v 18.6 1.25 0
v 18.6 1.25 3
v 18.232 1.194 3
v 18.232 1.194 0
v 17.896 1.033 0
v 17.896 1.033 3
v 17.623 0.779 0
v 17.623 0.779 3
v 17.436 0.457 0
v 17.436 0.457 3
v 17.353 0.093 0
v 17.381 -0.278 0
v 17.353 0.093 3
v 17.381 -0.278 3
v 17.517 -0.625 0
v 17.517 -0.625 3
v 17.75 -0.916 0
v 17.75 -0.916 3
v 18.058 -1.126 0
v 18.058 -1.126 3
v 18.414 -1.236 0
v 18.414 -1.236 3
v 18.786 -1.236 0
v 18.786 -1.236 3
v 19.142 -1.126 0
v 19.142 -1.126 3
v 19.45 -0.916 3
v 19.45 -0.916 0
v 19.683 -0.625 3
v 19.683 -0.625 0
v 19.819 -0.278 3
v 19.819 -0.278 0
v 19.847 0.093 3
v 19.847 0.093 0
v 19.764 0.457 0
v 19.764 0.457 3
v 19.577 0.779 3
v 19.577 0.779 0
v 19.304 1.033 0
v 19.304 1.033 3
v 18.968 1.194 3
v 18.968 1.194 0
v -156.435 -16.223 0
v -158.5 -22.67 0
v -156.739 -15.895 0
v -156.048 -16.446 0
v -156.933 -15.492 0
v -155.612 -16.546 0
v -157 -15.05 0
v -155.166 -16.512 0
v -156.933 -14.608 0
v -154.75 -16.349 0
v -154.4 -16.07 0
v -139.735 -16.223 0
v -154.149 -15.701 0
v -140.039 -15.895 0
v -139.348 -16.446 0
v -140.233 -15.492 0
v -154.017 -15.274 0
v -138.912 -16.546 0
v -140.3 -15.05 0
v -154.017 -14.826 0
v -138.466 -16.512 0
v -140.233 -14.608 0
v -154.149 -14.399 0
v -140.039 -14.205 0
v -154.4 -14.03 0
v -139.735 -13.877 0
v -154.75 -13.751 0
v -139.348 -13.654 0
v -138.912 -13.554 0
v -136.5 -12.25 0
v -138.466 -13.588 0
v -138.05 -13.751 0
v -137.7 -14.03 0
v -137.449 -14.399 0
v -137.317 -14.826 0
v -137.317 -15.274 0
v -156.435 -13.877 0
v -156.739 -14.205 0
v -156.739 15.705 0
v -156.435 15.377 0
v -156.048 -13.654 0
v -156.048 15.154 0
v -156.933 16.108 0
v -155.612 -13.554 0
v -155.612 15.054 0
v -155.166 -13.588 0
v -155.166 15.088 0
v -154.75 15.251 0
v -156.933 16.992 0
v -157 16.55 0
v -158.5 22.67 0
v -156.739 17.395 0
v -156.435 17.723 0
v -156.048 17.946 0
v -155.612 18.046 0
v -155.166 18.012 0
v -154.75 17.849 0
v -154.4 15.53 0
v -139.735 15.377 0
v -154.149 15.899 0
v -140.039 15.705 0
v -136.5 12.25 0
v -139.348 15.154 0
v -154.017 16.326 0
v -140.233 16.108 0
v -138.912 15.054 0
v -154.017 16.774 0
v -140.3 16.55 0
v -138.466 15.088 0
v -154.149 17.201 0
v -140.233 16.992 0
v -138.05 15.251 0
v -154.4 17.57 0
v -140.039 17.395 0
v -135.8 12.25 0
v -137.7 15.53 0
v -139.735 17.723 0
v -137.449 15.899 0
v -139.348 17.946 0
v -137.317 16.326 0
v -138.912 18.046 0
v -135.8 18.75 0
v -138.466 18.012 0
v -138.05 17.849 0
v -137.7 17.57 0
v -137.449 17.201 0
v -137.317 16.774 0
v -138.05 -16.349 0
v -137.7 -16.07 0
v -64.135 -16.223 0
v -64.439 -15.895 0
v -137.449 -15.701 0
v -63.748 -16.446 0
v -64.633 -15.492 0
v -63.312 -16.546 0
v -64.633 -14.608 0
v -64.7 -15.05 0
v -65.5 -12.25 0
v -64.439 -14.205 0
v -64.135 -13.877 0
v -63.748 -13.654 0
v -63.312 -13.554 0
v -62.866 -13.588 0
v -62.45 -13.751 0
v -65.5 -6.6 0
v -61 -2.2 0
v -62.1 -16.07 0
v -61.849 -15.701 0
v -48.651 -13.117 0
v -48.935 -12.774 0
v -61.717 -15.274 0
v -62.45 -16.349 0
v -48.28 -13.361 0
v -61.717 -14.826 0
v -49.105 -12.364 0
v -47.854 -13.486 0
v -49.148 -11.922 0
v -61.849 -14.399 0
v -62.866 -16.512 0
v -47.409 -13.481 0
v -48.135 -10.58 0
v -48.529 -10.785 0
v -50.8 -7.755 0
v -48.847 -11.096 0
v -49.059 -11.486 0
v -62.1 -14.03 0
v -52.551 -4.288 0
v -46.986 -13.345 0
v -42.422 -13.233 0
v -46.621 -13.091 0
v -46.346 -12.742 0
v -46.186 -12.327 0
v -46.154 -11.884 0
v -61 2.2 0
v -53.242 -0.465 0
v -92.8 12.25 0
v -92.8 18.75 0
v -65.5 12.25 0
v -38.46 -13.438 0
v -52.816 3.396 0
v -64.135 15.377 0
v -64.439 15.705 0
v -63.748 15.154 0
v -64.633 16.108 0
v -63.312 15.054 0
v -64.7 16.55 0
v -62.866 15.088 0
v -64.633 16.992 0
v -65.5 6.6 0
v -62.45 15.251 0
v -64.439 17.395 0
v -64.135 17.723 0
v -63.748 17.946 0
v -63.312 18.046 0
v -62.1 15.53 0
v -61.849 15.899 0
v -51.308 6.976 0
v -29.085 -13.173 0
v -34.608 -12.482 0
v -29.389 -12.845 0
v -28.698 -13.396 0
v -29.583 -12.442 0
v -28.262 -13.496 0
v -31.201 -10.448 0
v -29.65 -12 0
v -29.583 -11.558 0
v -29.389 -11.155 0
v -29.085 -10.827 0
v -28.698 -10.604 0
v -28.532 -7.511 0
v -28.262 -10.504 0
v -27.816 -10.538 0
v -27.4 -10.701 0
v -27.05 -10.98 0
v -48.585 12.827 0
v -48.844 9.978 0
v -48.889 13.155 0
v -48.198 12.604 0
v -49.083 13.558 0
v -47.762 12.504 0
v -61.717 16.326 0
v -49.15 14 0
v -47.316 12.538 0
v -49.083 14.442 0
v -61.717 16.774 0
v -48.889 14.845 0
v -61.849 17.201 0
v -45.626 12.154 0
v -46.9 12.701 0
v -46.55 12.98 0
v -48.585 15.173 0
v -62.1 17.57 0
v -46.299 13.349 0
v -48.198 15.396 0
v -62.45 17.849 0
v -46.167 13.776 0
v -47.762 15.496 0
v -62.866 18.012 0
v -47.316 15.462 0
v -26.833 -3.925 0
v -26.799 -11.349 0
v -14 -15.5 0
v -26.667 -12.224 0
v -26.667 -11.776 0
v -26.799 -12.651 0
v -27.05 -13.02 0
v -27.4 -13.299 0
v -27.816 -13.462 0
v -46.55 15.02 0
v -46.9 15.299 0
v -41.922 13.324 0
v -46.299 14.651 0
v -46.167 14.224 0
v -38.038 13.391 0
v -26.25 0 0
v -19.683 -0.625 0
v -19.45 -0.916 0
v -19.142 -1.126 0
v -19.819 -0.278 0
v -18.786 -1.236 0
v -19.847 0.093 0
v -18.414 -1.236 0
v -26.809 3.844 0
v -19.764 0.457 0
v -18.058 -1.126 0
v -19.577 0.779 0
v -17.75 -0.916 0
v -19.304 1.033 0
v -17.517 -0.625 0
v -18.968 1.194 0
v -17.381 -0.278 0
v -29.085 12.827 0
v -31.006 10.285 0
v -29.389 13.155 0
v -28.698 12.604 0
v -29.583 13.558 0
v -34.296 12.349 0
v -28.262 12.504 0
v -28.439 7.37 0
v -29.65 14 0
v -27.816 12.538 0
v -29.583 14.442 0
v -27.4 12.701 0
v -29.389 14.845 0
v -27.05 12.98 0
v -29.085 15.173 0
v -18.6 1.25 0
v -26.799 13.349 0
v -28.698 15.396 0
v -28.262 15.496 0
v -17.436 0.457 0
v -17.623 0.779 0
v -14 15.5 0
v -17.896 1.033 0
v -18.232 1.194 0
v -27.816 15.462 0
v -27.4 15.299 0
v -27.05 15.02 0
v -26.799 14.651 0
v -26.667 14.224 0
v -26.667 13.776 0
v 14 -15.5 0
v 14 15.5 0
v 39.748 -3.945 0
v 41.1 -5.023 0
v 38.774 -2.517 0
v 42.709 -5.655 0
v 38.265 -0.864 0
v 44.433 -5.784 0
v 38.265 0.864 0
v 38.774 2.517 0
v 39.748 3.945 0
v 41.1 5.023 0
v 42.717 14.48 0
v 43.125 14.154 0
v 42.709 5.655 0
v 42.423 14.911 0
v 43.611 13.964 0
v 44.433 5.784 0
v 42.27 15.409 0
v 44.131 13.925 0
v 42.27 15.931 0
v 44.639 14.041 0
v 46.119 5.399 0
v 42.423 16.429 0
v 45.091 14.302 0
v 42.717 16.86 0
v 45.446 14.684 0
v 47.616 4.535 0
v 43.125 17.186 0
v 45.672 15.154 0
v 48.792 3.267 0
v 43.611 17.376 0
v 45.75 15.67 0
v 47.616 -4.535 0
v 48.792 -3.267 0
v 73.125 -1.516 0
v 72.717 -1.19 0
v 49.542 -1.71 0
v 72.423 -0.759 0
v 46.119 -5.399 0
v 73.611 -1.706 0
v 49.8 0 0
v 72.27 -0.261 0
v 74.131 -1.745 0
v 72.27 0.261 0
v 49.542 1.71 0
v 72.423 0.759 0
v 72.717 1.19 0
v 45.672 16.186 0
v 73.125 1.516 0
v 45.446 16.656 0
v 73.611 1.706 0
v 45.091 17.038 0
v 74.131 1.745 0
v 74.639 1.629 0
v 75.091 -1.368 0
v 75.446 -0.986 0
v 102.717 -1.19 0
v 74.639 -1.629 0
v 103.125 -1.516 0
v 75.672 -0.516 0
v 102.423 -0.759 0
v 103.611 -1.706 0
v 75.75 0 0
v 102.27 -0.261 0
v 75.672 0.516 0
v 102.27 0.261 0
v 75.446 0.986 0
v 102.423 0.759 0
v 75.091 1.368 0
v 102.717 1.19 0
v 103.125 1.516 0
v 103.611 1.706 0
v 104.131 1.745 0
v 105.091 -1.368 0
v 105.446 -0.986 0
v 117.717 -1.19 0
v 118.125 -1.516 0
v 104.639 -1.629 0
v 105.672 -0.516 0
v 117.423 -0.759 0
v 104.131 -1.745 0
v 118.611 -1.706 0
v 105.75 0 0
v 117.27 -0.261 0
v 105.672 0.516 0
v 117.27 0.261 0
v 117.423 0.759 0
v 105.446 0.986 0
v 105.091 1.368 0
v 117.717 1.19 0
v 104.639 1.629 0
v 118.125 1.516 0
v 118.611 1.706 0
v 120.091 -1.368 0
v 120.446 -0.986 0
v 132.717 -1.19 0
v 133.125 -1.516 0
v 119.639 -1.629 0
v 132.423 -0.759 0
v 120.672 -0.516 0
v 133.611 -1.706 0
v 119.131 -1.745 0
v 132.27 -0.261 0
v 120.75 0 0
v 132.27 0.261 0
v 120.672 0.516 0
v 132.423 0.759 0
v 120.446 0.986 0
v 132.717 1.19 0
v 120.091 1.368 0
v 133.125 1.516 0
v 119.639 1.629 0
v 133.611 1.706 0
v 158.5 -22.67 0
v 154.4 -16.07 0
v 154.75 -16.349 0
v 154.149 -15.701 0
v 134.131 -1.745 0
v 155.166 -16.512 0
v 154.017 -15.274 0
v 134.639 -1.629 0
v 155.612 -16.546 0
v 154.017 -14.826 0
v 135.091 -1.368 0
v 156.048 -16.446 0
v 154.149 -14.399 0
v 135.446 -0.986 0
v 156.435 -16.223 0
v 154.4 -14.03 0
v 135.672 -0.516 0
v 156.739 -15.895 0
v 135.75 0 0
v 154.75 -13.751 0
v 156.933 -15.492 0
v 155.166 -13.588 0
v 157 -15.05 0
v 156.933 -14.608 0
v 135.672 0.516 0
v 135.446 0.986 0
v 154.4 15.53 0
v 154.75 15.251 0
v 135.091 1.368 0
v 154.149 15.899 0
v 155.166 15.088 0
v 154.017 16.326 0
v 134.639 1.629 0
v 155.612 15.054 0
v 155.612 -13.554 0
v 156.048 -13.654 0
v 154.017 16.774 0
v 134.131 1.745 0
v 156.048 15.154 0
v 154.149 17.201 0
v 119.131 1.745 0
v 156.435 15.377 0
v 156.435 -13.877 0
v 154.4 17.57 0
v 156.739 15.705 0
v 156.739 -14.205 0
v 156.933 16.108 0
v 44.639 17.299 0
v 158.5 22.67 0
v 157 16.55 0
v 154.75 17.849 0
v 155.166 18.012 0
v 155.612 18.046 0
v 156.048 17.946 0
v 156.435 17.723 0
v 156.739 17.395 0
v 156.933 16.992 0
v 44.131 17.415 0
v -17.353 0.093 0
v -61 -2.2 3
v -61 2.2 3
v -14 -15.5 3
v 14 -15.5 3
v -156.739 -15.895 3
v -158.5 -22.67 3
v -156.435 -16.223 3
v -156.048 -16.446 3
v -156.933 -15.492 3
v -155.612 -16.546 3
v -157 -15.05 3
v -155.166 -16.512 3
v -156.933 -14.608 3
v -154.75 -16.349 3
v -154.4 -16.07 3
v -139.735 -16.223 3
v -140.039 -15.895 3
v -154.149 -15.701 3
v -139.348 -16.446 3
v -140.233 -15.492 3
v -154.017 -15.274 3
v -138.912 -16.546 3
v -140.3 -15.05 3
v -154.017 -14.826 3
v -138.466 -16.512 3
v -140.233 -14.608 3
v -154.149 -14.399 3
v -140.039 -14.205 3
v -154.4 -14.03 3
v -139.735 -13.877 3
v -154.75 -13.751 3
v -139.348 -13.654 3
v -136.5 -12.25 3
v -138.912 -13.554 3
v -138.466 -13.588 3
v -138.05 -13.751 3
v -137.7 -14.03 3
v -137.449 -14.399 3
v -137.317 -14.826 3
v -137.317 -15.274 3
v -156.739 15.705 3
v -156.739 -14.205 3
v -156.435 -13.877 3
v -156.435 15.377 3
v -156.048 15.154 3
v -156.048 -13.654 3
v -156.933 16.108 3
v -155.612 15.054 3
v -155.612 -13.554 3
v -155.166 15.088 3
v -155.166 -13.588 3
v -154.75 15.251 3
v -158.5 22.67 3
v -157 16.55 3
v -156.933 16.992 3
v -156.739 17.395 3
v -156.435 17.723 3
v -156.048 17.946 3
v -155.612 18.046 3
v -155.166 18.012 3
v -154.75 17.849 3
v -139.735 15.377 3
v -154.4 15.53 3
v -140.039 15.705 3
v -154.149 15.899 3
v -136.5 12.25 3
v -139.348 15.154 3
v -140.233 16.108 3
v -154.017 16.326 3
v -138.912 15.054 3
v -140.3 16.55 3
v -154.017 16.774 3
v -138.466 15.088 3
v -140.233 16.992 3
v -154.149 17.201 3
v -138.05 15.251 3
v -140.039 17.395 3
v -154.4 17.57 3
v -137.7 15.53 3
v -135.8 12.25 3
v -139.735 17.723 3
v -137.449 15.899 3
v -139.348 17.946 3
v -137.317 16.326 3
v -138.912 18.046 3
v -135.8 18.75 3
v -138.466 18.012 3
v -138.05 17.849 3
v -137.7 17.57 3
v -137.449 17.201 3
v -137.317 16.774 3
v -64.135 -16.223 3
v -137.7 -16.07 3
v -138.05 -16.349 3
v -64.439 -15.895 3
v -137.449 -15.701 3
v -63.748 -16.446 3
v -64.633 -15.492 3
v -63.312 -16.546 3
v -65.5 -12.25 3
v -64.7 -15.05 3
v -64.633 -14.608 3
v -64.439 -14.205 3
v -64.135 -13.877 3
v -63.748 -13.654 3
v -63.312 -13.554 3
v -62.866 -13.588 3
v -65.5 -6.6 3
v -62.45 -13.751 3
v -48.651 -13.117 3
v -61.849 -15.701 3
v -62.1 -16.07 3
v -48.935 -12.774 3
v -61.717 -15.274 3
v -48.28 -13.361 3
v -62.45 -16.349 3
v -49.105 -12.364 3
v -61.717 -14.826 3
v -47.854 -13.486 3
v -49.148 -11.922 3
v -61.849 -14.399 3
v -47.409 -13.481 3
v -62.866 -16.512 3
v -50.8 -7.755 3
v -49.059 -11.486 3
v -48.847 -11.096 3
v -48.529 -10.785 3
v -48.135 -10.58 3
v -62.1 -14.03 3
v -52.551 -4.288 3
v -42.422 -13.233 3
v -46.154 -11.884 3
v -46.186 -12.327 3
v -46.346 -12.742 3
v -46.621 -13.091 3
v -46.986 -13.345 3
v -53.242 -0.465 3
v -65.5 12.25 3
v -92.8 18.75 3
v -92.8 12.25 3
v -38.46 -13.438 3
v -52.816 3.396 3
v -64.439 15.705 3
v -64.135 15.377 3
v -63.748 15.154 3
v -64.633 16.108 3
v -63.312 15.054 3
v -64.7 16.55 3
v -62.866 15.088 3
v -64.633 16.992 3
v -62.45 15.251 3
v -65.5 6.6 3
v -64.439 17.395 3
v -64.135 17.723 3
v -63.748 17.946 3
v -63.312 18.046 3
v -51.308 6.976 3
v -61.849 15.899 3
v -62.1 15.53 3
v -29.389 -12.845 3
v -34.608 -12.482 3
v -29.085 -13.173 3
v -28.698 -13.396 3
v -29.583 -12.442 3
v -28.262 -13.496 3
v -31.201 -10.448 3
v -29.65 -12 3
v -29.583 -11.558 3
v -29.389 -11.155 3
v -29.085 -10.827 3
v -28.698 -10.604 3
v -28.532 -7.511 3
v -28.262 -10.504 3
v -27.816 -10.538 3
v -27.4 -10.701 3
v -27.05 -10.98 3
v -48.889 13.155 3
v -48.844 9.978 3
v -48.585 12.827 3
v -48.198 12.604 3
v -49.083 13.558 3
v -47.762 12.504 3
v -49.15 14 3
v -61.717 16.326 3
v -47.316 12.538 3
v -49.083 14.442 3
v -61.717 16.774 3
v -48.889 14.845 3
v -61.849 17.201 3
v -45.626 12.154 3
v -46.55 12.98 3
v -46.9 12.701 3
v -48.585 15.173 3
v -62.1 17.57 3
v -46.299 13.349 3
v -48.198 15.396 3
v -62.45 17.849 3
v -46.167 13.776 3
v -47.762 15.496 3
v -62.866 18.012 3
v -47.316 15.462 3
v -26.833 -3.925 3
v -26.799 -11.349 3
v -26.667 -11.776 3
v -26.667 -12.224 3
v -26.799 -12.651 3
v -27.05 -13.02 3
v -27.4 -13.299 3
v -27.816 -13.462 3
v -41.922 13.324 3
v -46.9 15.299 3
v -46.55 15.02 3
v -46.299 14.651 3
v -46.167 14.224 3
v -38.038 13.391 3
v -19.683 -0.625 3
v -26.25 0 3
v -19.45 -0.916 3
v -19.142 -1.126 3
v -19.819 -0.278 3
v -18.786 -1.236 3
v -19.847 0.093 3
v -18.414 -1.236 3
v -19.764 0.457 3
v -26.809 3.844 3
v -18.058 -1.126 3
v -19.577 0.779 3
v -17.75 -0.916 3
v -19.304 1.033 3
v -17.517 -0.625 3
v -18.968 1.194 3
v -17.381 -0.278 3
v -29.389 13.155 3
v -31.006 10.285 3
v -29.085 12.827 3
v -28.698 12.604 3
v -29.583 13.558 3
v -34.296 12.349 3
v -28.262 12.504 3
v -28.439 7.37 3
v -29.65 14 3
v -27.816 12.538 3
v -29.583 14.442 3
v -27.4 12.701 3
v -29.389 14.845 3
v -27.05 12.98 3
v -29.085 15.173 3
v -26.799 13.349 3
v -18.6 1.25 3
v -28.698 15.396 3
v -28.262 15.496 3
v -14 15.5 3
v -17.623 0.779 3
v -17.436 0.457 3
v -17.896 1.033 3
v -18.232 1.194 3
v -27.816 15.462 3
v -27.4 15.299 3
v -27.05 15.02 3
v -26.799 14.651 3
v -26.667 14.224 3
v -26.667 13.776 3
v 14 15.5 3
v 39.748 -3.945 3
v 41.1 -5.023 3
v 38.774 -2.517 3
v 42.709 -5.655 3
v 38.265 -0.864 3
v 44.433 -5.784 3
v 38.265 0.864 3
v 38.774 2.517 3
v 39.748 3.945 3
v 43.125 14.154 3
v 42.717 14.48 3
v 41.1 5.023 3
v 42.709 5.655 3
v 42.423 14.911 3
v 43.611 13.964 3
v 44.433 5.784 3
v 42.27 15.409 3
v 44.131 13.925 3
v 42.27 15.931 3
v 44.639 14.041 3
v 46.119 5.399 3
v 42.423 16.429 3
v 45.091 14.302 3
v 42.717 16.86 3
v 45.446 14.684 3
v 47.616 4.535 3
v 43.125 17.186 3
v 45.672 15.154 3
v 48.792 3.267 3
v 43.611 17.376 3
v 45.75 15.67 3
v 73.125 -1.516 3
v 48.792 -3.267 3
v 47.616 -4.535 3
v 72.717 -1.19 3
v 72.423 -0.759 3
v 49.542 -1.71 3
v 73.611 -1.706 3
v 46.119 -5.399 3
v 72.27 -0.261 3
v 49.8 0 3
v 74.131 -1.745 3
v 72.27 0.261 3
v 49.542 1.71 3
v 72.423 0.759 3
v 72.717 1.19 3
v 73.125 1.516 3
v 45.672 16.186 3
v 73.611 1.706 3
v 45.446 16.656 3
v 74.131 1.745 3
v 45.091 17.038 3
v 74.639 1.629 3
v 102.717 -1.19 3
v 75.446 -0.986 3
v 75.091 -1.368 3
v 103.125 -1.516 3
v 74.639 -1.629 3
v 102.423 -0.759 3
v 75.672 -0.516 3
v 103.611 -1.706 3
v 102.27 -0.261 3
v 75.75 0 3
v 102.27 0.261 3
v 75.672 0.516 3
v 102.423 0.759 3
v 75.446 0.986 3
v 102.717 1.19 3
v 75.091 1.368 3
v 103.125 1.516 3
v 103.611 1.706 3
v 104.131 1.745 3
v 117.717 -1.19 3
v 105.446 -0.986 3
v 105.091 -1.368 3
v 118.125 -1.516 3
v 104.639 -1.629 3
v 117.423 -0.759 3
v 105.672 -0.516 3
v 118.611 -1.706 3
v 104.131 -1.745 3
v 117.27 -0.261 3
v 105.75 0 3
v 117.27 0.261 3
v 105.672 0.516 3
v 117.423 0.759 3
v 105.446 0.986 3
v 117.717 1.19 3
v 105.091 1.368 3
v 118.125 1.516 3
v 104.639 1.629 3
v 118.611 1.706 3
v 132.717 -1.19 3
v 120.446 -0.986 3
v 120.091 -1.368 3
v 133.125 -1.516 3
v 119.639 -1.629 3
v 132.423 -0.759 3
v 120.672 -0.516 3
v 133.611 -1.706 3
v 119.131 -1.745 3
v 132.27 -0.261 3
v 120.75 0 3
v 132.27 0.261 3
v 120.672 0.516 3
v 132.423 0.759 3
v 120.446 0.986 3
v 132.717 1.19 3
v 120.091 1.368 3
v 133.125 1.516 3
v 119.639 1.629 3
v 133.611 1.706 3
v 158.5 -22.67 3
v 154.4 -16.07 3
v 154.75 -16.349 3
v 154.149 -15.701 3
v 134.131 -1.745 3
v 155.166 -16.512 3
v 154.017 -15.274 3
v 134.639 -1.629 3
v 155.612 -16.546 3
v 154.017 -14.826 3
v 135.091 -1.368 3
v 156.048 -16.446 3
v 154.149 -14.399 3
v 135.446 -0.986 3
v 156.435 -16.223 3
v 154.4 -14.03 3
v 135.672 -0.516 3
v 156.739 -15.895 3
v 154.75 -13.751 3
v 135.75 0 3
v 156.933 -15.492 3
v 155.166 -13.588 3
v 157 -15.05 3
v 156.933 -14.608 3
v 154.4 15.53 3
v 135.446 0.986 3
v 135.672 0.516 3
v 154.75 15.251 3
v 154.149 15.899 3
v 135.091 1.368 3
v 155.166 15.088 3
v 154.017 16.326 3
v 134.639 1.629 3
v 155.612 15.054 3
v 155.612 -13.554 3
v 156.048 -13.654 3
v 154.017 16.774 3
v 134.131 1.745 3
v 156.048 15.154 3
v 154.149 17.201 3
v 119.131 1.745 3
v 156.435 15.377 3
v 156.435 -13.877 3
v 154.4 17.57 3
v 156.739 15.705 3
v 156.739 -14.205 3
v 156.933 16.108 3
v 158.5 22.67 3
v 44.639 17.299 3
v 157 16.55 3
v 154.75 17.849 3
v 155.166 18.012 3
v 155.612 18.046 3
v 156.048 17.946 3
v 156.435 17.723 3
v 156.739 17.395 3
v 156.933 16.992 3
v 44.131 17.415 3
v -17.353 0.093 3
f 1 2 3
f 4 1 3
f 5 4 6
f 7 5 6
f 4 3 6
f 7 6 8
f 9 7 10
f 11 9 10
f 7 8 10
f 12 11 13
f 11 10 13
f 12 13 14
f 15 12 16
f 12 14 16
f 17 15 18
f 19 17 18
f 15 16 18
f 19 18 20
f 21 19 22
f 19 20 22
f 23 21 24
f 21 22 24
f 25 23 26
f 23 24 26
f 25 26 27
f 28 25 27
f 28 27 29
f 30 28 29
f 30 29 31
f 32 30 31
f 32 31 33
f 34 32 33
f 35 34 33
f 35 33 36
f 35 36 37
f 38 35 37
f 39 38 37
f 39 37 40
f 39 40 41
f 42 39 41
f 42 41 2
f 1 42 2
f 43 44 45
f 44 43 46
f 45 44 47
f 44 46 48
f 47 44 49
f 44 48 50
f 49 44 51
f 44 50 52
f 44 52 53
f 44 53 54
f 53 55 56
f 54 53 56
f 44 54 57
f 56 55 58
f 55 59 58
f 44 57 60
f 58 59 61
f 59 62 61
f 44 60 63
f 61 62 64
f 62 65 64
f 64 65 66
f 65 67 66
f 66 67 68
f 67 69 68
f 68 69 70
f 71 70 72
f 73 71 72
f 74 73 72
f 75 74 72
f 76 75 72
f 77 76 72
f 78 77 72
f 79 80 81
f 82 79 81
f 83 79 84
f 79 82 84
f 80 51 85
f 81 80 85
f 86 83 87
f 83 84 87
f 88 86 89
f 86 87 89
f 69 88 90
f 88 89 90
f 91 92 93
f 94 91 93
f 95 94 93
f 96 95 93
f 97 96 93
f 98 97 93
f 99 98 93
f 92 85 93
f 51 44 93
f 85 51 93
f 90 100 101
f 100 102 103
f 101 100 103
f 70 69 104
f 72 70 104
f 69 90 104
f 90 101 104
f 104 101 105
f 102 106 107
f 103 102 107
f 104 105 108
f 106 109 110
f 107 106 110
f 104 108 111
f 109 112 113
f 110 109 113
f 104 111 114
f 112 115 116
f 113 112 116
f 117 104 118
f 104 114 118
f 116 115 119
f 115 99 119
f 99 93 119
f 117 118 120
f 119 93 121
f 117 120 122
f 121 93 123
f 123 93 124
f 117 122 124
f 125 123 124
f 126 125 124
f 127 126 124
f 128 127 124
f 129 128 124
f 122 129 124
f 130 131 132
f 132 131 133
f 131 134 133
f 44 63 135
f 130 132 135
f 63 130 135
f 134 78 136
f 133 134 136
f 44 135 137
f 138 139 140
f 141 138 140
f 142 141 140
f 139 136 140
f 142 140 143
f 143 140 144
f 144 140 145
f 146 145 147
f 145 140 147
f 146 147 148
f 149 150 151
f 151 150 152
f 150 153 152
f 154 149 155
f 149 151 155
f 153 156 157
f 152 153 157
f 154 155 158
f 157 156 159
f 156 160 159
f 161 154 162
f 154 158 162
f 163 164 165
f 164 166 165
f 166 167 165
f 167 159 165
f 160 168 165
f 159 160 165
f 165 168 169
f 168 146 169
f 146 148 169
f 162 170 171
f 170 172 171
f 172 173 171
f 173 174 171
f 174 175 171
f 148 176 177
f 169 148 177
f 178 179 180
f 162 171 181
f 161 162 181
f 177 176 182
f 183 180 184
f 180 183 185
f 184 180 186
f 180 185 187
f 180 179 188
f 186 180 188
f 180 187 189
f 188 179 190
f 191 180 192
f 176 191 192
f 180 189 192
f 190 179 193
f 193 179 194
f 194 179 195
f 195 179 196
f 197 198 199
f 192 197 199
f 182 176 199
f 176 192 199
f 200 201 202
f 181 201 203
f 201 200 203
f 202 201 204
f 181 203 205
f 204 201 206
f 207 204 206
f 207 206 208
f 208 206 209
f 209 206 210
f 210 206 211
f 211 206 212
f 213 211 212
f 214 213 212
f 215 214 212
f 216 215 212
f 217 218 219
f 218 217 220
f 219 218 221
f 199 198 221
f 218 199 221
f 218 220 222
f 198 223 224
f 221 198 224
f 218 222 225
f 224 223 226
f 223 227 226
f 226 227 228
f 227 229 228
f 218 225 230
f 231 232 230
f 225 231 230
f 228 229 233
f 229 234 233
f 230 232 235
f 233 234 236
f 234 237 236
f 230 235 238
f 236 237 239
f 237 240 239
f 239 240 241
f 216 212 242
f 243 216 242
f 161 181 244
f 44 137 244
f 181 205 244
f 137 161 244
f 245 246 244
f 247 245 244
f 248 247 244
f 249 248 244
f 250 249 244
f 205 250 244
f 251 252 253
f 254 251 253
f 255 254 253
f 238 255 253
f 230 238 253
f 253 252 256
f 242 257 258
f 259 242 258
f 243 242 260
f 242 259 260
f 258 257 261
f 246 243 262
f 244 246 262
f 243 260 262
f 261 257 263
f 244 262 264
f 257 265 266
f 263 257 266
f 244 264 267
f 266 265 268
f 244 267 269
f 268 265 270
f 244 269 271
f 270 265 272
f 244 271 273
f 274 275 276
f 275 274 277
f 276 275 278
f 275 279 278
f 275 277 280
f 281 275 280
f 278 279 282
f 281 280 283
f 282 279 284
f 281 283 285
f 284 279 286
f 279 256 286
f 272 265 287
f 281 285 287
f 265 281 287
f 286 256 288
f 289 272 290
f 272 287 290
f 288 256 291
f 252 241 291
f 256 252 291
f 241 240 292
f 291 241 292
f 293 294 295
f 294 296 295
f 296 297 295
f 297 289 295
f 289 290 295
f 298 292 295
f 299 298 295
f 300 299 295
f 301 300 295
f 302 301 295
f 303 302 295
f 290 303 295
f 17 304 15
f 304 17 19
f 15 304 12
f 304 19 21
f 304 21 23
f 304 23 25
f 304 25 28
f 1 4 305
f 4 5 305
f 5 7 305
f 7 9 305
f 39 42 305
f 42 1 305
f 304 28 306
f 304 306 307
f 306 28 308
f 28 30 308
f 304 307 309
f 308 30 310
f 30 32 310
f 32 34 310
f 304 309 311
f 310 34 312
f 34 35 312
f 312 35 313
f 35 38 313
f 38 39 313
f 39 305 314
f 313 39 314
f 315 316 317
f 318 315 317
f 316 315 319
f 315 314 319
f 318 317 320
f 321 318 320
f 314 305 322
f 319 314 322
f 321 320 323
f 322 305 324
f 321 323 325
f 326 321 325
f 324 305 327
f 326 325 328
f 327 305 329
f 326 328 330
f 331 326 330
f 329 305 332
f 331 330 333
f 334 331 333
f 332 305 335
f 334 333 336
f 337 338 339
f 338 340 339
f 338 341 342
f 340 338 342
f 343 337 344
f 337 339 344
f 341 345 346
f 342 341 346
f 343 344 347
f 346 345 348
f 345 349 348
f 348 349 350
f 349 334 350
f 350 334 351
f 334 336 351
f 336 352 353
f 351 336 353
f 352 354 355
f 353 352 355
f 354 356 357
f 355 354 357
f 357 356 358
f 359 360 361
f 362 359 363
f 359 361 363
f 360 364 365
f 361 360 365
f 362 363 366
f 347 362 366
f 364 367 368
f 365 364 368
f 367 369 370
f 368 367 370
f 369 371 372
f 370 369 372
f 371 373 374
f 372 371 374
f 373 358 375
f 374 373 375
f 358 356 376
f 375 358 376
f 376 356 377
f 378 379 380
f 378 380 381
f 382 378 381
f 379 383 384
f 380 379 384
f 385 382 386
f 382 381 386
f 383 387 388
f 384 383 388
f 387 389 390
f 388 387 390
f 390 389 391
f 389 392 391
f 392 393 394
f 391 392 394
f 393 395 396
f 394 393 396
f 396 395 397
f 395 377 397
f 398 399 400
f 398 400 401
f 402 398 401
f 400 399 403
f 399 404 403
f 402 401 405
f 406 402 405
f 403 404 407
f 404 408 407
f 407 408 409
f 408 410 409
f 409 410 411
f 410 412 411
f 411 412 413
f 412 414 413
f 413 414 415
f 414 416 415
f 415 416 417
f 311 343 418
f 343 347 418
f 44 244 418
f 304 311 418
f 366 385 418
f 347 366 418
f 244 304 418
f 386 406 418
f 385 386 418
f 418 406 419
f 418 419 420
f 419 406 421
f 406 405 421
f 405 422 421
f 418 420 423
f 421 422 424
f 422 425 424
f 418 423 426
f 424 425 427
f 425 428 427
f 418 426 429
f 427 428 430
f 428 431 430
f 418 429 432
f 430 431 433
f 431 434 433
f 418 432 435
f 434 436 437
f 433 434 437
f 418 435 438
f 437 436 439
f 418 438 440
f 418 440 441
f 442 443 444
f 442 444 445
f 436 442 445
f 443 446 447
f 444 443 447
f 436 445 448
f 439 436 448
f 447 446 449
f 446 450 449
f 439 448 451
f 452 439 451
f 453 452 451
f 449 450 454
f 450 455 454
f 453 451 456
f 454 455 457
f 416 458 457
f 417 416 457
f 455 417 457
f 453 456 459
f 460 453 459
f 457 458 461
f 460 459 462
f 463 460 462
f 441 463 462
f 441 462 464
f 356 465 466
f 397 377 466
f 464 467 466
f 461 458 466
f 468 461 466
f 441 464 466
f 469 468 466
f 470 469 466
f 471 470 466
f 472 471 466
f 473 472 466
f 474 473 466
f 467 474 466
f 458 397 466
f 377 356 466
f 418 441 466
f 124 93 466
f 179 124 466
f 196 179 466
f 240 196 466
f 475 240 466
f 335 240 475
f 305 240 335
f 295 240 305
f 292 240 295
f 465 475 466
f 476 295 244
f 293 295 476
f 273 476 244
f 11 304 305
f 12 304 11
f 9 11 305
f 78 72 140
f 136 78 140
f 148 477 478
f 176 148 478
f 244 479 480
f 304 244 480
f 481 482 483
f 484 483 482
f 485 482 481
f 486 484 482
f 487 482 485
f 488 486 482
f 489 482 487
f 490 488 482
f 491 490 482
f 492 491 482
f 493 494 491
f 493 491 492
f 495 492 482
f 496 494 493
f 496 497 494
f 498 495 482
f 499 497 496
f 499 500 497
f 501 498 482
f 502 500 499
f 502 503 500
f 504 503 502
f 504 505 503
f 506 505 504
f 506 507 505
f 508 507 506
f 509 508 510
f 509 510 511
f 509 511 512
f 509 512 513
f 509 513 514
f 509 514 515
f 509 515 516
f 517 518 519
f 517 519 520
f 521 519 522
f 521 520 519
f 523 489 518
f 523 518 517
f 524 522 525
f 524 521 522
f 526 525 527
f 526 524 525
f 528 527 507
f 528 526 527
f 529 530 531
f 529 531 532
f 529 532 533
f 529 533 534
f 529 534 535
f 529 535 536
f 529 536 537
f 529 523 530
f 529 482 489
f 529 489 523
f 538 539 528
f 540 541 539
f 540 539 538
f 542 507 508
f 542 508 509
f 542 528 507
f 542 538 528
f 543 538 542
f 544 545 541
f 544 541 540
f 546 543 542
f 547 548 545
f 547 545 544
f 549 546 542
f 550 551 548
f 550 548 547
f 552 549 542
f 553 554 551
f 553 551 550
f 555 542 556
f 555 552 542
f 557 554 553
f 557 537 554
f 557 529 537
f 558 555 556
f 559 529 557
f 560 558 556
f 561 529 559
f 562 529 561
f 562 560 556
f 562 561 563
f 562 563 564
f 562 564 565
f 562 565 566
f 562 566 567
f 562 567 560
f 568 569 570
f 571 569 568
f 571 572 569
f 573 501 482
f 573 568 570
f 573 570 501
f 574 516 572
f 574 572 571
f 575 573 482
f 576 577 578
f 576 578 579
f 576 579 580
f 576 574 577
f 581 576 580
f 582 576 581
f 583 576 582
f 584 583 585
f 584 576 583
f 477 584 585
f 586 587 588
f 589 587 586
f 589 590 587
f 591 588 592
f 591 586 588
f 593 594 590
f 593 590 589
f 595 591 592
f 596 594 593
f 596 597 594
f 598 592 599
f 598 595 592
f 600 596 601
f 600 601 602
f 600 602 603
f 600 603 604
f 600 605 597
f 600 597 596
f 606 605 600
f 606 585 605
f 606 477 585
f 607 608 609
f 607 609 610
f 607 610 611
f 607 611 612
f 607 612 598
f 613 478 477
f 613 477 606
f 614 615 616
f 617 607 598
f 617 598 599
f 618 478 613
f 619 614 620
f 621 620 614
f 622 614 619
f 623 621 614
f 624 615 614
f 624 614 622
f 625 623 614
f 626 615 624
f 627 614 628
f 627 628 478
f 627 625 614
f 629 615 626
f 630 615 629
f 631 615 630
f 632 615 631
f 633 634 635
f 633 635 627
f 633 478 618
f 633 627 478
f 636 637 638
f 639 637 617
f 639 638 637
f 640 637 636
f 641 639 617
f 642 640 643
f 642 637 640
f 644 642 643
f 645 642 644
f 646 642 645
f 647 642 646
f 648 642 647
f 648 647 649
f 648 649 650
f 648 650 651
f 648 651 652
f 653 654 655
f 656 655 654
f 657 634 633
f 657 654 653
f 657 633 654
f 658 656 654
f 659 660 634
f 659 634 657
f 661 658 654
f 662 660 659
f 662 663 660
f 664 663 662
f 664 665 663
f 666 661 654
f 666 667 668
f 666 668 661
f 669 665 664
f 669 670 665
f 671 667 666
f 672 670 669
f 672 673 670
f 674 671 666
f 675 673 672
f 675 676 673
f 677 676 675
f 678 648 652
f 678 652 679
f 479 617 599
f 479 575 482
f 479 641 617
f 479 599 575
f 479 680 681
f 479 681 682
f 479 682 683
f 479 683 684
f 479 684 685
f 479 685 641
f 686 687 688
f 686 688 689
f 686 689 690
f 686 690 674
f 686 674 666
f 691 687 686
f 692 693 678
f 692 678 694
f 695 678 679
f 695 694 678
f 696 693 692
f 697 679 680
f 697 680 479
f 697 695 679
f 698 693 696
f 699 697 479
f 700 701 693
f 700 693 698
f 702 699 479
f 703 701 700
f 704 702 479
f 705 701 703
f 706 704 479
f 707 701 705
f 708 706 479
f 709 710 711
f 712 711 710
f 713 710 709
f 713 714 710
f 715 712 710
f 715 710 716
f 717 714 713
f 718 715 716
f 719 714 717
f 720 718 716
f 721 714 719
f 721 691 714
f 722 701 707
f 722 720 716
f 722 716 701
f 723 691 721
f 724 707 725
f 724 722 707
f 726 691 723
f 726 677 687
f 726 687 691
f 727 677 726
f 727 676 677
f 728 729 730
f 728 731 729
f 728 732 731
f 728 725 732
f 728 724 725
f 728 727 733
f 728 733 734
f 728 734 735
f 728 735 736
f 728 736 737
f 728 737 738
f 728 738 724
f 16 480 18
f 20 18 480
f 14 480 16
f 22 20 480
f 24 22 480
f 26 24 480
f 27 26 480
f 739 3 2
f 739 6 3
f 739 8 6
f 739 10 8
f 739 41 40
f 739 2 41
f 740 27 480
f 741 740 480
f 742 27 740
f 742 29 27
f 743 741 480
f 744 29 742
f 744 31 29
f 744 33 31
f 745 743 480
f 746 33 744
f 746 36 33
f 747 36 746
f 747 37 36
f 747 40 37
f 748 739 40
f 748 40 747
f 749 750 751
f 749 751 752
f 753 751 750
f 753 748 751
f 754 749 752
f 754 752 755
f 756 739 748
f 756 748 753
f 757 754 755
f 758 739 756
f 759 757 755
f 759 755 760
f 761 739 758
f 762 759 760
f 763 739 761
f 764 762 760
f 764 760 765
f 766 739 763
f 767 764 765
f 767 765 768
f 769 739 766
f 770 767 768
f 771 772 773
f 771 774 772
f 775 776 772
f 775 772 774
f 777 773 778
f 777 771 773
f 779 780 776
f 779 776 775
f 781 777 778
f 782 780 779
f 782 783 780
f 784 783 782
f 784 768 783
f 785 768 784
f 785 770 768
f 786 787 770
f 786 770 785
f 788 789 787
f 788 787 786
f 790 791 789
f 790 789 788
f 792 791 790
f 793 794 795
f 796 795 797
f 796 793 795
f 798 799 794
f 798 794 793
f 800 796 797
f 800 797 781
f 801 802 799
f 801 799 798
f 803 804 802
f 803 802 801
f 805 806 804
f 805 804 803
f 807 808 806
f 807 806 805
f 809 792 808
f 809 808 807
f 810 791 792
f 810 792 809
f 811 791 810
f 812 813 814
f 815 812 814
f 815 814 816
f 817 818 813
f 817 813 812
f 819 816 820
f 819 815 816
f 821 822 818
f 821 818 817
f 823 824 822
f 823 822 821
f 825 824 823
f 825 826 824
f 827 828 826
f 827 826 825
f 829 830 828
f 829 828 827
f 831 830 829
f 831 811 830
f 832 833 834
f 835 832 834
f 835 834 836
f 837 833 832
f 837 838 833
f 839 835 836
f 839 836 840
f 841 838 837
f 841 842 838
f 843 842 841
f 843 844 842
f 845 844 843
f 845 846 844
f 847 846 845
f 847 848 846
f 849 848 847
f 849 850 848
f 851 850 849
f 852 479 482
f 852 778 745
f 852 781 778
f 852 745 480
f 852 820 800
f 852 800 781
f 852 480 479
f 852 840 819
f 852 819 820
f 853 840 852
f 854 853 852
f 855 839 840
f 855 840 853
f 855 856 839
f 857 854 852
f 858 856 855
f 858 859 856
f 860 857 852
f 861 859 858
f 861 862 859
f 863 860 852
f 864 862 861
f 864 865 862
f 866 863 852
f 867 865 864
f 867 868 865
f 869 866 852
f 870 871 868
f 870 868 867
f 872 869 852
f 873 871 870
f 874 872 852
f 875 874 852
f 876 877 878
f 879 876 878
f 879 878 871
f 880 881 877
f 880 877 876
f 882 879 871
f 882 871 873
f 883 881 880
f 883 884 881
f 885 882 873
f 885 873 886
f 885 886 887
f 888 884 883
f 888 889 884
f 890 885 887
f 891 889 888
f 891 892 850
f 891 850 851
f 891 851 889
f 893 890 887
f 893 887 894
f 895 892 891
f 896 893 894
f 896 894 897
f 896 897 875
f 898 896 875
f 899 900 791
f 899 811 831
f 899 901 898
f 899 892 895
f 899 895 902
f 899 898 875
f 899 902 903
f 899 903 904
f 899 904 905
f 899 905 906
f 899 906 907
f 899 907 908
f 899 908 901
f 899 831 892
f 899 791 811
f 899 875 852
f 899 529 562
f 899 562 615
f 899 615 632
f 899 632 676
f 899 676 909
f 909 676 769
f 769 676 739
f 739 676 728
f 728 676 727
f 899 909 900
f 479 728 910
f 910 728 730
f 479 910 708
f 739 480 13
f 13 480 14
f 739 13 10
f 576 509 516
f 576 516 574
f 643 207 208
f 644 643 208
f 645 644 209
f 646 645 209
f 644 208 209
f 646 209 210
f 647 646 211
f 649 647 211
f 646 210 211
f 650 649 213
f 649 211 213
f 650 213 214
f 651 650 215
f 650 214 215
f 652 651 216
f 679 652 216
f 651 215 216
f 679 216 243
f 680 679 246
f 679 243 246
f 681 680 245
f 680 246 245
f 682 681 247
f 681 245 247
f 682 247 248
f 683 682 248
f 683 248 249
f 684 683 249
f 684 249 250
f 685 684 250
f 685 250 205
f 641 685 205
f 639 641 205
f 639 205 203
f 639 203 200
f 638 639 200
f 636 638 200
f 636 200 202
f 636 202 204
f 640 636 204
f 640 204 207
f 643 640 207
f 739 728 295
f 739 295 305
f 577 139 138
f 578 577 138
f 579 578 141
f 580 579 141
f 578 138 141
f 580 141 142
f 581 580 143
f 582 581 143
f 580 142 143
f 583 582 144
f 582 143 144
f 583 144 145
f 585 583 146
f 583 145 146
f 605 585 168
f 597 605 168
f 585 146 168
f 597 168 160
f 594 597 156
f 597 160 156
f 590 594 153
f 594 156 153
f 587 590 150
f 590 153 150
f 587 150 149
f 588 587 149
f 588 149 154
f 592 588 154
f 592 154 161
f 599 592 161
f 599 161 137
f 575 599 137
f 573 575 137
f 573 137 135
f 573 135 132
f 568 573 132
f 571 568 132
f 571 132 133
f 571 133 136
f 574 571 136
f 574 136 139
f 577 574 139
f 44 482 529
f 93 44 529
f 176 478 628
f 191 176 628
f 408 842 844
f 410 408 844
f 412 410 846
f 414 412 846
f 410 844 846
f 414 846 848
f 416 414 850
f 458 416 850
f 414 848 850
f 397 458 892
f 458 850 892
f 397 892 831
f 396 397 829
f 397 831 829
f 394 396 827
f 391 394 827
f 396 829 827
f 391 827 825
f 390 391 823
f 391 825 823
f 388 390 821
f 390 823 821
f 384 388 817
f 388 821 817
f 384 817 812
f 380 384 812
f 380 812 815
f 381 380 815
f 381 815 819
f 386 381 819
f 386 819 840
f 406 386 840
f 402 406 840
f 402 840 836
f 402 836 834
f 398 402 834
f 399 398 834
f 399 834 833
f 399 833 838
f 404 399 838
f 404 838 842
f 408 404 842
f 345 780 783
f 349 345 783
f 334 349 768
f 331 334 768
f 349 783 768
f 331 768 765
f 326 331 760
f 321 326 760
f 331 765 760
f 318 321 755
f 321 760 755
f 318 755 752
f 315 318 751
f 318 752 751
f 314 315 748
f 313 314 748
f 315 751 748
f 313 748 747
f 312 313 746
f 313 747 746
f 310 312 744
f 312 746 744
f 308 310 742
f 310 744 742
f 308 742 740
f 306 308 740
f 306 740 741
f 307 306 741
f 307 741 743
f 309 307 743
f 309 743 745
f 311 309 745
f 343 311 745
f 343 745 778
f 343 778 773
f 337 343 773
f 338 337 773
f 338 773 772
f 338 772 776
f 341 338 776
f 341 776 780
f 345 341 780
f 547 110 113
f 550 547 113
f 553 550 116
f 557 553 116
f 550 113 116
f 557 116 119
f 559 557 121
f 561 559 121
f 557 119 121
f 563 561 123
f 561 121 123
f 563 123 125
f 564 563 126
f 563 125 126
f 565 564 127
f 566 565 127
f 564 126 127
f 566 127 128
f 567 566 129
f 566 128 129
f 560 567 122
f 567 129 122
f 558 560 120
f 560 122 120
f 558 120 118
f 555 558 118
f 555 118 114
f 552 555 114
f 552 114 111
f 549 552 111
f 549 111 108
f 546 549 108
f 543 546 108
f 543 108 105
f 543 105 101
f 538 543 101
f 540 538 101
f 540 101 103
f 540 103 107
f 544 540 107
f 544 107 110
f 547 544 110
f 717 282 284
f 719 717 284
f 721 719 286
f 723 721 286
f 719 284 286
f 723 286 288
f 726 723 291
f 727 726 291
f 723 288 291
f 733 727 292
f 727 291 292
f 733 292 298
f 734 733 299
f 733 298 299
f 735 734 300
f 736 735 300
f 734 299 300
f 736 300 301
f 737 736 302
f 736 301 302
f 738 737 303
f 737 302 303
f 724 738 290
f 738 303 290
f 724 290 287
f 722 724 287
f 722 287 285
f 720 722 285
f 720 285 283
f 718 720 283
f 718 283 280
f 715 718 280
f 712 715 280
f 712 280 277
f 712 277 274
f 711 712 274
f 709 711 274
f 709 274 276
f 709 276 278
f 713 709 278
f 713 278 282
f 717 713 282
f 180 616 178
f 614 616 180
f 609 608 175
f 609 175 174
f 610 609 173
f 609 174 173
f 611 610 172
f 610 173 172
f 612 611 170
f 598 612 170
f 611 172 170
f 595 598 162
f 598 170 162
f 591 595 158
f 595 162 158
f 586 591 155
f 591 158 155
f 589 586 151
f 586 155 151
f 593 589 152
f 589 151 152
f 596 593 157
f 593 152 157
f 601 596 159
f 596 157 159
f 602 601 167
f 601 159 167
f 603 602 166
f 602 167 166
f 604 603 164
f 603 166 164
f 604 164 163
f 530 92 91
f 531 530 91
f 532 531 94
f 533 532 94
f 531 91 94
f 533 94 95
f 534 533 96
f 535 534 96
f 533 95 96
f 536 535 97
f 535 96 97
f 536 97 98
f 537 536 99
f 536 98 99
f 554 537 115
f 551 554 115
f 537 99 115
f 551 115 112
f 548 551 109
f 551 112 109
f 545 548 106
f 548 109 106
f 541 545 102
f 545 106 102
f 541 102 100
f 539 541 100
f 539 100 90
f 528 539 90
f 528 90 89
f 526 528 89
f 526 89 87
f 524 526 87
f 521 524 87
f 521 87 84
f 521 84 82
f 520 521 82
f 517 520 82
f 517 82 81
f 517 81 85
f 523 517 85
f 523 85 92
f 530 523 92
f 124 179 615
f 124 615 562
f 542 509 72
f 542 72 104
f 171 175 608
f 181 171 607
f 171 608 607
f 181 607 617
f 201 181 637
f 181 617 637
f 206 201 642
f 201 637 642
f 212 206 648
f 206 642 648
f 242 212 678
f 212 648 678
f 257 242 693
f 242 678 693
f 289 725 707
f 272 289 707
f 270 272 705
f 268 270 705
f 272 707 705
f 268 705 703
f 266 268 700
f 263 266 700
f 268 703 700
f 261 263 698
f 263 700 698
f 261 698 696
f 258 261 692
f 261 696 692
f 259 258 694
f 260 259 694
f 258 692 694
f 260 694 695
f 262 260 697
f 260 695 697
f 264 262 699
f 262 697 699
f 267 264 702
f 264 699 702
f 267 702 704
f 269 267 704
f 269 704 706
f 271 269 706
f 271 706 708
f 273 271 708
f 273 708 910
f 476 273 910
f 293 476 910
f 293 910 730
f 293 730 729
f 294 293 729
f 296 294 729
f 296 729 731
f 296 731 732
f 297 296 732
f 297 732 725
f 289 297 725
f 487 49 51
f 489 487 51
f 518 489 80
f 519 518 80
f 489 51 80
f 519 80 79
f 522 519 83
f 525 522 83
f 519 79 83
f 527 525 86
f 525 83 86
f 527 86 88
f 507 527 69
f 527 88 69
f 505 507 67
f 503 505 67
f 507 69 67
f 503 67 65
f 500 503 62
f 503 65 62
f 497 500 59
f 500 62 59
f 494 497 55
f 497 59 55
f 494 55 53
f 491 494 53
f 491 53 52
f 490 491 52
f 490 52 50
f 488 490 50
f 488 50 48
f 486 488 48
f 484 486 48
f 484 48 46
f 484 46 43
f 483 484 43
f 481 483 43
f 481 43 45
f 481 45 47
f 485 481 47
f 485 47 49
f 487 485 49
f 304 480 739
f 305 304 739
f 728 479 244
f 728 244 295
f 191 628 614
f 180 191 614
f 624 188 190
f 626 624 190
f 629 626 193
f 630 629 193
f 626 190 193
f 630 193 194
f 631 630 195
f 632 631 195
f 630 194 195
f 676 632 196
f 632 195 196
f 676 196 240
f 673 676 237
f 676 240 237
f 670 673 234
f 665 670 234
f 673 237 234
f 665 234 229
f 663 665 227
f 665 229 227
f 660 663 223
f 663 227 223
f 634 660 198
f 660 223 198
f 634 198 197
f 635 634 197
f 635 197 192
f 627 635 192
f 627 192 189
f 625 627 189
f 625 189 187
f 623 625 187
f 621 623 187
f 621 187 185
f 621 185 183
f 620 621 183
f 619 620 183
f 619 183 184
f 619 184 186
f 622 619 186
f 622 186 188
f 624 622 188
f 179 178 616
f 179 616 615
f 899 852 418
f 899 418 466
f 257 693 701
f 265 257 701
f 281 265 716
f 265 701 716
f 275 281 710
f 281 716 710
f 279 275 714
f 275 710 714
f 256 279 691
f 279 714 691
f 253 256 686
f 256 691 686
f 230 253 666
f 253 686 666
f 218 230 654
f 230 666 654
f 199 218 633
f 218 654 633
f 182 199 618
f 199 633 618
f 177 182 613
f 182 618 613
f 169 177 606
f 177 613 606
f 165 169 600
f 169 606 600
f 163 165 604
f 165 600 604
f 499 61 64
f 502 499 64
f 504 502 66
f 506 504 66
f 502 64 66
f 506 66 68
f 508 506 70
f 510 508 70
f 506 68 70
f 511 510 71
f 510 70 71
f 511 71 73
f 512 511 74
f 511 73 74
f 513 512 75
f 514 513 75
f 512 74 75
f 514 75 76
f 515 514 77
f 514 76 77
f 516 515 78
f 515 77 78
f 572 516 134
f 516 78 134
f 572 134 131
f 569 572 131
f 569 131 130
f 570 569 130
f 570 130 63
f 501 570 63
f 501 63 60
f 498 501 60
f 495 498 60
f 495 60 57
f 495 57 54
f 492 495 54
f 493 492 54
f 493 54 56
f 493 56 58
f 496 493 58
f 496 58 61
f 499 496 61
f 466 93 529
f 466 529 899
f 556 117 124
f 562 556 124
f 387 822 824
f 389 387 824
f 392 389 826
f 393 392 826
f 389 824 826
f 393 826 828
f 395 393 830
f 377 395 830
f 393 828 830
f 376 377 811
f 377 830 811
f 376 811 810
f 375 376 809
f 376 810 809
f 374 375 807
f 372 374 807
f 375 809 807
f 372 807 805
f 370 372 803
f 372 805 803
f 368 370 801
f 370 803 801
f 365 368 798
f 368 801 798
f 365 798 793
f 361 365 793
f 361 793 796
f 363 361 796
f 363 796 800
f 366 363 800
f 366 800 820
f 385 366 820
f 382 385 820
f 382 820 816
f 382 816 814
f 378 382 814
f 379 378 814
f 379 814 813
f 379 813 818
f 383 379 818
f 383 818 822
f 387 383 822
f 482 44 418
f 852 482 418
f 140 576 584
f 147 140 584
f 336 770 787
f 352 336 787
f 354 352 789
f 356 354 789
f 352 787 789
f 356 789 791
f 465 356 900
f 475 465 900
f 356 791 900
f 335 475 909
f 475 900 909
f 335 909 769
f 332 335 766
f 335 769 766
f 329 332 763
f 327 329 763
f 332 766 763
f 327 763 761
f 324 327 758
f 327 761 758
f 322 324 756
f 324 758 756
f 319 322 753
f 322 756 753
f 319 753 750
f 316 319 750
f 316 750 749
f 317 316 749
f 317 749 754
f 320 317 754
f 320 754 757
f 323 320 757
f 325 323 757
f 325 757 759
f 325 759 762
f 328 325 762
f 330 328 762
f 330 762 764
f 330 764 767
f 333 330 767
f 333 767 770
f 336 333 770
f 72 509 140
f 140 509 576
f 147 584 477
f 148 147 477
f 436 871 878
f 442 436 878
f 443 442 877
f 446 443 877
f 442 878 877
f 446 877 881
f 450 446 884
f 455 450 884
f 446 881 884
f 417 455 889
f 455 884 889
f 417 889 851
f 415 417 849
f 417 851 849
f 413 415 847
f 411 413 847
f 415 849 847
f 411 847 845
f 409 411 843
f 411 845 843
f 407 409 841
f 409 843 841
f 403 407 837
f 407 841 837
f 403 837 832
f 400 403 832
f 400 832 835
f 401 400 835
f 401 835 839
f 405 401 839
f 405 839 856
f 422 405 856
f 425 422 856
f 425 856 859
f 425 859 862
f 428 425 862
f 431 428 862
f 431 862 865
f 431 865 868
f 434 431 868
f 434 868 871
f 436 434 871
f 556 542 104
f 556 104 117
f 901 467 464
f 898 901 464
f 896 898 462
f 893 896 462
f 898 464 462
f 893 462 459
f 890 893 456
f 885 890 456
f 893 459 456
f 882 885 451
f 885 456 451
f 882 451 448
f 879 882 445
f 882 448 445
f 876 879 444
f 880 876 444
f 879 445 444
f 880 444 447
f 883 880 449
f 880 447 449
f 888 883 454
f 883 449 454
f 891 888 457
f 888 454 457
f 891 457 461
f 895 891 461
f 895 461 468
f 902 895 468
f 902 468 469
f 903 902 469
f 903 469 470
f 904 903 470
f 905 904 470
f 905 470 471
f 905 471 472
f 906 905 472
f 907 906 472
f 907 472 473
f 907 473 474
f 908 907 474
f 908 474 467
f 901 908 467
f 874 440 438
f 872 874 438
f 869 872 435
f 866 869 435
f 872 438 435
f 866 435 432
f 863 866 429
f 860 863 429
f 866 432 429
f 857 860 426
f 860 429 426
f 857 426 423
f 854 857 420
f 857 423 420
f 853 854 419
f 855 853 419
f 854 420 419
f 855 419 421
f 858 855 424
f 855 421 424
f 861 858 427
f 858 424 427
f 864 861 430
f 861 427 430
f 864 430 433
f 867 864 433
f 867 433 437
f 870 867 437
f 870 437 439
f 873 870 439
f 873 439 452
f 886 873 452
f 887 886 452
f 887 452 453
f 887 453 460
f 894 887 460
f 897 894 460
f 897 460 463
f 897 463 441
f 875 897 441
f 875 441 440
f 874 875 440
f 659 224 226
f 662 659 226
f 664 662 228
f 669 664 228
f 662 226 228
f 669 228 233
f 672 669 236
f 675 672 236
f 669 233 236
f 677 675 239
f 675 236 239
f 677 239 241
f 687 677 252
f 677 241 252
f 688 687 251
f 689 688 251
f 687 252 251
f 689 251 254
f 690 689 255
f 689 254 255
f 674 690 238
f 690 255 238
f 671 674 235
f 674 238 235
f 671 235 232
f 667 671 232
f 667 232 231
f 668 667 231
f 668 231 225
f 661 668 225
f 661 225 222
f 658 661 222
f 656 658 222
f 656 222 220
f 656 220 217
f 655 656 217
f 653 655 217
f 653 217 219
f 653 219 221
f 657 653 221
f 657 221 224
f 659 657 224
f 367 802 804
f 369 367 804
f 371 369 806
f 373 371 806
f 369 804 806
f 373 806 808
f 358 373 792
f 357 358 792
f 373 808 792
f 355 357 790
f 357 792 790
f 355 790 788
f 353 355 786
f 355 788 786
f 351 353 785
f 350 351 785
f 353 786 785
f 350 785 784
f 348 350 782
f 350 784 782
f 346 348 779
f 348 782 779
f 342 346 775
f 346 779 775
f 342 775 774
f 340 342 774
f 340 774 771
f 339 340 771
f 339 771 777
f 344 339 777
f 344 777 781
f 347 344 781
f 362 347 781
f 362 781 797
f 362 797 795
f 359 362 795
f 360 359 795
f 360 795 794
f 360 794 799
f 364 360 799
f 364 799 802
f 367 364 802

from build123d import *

# Parameters (mm, degrees)
SKETCH1_W               = 323
SKETCH1_H               = 45.34
BOSS_EXTRUDE1_DEPTH     = 3
SKETCH2_W               = 71
SKETCH2_H               = 24.5
SKETCH2_R               = 13.5
SKETCH2_W_2             = 28
SKETCH2_H_2             = 31
SKETCH2_R_2             = 5.8
SKETCH2_R_3             = 1.75
CUT_EXTRUDE1_DEPTH      = 1
CUT_EXTRUDE1_DEPTH_BACK = 4
SKETCH3_R               = 1.5
SKETCH3_W               = 43
SKETCH3_H               = 7
CUT_EXTRUDE2_DEPTH      = 10
CUT_EXTRUDE4_DEPTH      = 10
SKETCH6_W               = 3
SKETCH6_H               = 45.34
CUT_EXTRUDE5_DEPTH      = 10
SKETCH7_R               = 1.5
CUT_EXTRUDE6_DEPTH      = 4


with BuildPart() as part:
    # Sketch1 → Boss-Extrude1 (new body)
    with BuildSketch(Plane.XY):
        Rectangle(SKETCH1_W, SKETCH1_H)
    extrude(amount=BOSS_EXTRUDE1_DEPTH)

    # Sketch2 → Cut-Extrude1 (cut, two sides)
    with BuildSketch(Plane.XY.offset(3)) as cut_extrude1_sk:
        with Locations((-101, 0)):
            Rectangle(SKETCH2_W, SKETCH2_H)
        Polygon((-61, 2.2), (-65.5, 6.6), (-65.5, -6.6), (-61, -2.2), align=None)
        with Locations((-39.75, 0)):
            Circle(SKETCH2_R)
        Rectangle(SKETCH2_W_2, SKETCH2_H_2)
        with Locations((44, 0)):
            Circle(SKETCH2_R_2)
        with Locations((44, 15.67)):
            Circle(SKETCH2_R_3)
        with Locations((74, 0)):
            Circle(SKETCH2_R_3)
        with Locations((104, 0)):
            Circle(SKETCH2_R_3)
        with Locations((119, 0)):
            Circle(SKETCH2_R_3)
        with Locations((134, 0)):
            Circle(SKETCH2_R_3)
    extrude(amount=CUT_EXTRUDE1_DEPTH, mode=Mode.SUBTRACT)
    extrude(cut_extrude1_sk.sketch, amount=-CUT_EXTRUDE1_DEPTH_BACK, mode=Mode.SUBTRACT)

    # Sketch3 → Cut-Extrude2 (cut)
    with BuildSketch(Plane(origin=(0, 0, 0), x_dir=(-1, 0, 0), z_dir=(0, 0, -1))):
        with Locations((63.2, 16.55)):
            Circle(SKETCH3_R)
        with Locations((63.2, -15.05)):
            Circle(SKETCH3_R)
        with Locations((138.8, -15.05)):
            Circle(SKETCH3_R)
        with Locations((138.8, 16.55)):
            Circle(SKETCH3_R)
        with Locations((155.5, 16.55)):
            Circle(SKETCH3_R)
        with Locations((155.5, -15.05)):
            Circle(SKETCH3_R)
        with Locations(Location((-155.5, -15.05, 0), (0, 0, 180))):  # turned: the seam where the file's is
            Circle(SKETCH3_R)
        with Locations(Location((-155.5, 16.55, 0), (0, 0, 180))):  # turned: the seam where the file's is
            Circle(SKETCH3_R)
        with Locations((114.3, 15.25)):
            Rectangle(SKETCH3_W, SKETCH3_H)
    extrude(amount=-CUT_EXTRUDE2_DEPTH, mode=Mode.SUBTRACT)

    # Sketch5 → Cut-Extrude4 (cut)
    with BuildSketch(Plane.XY.offset(3)):
        with BuildLine():
            ThreePointArc((18.6, -1.25), (19.85, 0), (18.6, 1.25))
            ThreePointArc((18.6, 1.25), (17.35, 0), (18.6, -1.25))
        make_face()
        with BuildLine():
            ThreePointArc((-18.6, -1.25), (-17.35, 0), (-18.6, 1.25))
            ThreePointArc((-18.6, 1.25), (-19.85, 0), (-18.6, -1.25))
        make_face()
    extrude(amount=-CUT_EXTRUDE4_DEPTH, mode=Mode.SUBTRACT)

    # Sketch6 → Cut-Extrude5 (cut)
    with BuildSketch(Plane.XY.offset(3)):
        with Locations((-160, 0)):
            Rectangle(SKETCH6_W, SKETCH6_H)
        with Locations((160, 0)):
            Rectangle(SKETCH6_W, SKETCH6_H)
    extrude(amount=-CUT_EXTRUDE5_DEPTH, mode=Mode.SUBTRACT)

    # Sketch7 → Cut-Extrude6 (cut, through all)
    with BuildSketch(Plane(origin=(0, 0, 0), x_dir=(-1, 0, 0), z_dir=(0, 0, -1))):
        with Locations((28.15, -12)):
            Circle(SKETCH7_R)
        with Locations((47.65, -12)):
            Circle(SKETCH7_R)
        with Locations((47.65, 14)):
            Circle(SKETCH7_R)
        with Locations((28.15, 14)):
            Circle(SKETCH7_R)
    extrude(amount=-CUT_EXTRUDE6_DEPTH, mode=Mode.SUBTRACT)


solid = part.part
